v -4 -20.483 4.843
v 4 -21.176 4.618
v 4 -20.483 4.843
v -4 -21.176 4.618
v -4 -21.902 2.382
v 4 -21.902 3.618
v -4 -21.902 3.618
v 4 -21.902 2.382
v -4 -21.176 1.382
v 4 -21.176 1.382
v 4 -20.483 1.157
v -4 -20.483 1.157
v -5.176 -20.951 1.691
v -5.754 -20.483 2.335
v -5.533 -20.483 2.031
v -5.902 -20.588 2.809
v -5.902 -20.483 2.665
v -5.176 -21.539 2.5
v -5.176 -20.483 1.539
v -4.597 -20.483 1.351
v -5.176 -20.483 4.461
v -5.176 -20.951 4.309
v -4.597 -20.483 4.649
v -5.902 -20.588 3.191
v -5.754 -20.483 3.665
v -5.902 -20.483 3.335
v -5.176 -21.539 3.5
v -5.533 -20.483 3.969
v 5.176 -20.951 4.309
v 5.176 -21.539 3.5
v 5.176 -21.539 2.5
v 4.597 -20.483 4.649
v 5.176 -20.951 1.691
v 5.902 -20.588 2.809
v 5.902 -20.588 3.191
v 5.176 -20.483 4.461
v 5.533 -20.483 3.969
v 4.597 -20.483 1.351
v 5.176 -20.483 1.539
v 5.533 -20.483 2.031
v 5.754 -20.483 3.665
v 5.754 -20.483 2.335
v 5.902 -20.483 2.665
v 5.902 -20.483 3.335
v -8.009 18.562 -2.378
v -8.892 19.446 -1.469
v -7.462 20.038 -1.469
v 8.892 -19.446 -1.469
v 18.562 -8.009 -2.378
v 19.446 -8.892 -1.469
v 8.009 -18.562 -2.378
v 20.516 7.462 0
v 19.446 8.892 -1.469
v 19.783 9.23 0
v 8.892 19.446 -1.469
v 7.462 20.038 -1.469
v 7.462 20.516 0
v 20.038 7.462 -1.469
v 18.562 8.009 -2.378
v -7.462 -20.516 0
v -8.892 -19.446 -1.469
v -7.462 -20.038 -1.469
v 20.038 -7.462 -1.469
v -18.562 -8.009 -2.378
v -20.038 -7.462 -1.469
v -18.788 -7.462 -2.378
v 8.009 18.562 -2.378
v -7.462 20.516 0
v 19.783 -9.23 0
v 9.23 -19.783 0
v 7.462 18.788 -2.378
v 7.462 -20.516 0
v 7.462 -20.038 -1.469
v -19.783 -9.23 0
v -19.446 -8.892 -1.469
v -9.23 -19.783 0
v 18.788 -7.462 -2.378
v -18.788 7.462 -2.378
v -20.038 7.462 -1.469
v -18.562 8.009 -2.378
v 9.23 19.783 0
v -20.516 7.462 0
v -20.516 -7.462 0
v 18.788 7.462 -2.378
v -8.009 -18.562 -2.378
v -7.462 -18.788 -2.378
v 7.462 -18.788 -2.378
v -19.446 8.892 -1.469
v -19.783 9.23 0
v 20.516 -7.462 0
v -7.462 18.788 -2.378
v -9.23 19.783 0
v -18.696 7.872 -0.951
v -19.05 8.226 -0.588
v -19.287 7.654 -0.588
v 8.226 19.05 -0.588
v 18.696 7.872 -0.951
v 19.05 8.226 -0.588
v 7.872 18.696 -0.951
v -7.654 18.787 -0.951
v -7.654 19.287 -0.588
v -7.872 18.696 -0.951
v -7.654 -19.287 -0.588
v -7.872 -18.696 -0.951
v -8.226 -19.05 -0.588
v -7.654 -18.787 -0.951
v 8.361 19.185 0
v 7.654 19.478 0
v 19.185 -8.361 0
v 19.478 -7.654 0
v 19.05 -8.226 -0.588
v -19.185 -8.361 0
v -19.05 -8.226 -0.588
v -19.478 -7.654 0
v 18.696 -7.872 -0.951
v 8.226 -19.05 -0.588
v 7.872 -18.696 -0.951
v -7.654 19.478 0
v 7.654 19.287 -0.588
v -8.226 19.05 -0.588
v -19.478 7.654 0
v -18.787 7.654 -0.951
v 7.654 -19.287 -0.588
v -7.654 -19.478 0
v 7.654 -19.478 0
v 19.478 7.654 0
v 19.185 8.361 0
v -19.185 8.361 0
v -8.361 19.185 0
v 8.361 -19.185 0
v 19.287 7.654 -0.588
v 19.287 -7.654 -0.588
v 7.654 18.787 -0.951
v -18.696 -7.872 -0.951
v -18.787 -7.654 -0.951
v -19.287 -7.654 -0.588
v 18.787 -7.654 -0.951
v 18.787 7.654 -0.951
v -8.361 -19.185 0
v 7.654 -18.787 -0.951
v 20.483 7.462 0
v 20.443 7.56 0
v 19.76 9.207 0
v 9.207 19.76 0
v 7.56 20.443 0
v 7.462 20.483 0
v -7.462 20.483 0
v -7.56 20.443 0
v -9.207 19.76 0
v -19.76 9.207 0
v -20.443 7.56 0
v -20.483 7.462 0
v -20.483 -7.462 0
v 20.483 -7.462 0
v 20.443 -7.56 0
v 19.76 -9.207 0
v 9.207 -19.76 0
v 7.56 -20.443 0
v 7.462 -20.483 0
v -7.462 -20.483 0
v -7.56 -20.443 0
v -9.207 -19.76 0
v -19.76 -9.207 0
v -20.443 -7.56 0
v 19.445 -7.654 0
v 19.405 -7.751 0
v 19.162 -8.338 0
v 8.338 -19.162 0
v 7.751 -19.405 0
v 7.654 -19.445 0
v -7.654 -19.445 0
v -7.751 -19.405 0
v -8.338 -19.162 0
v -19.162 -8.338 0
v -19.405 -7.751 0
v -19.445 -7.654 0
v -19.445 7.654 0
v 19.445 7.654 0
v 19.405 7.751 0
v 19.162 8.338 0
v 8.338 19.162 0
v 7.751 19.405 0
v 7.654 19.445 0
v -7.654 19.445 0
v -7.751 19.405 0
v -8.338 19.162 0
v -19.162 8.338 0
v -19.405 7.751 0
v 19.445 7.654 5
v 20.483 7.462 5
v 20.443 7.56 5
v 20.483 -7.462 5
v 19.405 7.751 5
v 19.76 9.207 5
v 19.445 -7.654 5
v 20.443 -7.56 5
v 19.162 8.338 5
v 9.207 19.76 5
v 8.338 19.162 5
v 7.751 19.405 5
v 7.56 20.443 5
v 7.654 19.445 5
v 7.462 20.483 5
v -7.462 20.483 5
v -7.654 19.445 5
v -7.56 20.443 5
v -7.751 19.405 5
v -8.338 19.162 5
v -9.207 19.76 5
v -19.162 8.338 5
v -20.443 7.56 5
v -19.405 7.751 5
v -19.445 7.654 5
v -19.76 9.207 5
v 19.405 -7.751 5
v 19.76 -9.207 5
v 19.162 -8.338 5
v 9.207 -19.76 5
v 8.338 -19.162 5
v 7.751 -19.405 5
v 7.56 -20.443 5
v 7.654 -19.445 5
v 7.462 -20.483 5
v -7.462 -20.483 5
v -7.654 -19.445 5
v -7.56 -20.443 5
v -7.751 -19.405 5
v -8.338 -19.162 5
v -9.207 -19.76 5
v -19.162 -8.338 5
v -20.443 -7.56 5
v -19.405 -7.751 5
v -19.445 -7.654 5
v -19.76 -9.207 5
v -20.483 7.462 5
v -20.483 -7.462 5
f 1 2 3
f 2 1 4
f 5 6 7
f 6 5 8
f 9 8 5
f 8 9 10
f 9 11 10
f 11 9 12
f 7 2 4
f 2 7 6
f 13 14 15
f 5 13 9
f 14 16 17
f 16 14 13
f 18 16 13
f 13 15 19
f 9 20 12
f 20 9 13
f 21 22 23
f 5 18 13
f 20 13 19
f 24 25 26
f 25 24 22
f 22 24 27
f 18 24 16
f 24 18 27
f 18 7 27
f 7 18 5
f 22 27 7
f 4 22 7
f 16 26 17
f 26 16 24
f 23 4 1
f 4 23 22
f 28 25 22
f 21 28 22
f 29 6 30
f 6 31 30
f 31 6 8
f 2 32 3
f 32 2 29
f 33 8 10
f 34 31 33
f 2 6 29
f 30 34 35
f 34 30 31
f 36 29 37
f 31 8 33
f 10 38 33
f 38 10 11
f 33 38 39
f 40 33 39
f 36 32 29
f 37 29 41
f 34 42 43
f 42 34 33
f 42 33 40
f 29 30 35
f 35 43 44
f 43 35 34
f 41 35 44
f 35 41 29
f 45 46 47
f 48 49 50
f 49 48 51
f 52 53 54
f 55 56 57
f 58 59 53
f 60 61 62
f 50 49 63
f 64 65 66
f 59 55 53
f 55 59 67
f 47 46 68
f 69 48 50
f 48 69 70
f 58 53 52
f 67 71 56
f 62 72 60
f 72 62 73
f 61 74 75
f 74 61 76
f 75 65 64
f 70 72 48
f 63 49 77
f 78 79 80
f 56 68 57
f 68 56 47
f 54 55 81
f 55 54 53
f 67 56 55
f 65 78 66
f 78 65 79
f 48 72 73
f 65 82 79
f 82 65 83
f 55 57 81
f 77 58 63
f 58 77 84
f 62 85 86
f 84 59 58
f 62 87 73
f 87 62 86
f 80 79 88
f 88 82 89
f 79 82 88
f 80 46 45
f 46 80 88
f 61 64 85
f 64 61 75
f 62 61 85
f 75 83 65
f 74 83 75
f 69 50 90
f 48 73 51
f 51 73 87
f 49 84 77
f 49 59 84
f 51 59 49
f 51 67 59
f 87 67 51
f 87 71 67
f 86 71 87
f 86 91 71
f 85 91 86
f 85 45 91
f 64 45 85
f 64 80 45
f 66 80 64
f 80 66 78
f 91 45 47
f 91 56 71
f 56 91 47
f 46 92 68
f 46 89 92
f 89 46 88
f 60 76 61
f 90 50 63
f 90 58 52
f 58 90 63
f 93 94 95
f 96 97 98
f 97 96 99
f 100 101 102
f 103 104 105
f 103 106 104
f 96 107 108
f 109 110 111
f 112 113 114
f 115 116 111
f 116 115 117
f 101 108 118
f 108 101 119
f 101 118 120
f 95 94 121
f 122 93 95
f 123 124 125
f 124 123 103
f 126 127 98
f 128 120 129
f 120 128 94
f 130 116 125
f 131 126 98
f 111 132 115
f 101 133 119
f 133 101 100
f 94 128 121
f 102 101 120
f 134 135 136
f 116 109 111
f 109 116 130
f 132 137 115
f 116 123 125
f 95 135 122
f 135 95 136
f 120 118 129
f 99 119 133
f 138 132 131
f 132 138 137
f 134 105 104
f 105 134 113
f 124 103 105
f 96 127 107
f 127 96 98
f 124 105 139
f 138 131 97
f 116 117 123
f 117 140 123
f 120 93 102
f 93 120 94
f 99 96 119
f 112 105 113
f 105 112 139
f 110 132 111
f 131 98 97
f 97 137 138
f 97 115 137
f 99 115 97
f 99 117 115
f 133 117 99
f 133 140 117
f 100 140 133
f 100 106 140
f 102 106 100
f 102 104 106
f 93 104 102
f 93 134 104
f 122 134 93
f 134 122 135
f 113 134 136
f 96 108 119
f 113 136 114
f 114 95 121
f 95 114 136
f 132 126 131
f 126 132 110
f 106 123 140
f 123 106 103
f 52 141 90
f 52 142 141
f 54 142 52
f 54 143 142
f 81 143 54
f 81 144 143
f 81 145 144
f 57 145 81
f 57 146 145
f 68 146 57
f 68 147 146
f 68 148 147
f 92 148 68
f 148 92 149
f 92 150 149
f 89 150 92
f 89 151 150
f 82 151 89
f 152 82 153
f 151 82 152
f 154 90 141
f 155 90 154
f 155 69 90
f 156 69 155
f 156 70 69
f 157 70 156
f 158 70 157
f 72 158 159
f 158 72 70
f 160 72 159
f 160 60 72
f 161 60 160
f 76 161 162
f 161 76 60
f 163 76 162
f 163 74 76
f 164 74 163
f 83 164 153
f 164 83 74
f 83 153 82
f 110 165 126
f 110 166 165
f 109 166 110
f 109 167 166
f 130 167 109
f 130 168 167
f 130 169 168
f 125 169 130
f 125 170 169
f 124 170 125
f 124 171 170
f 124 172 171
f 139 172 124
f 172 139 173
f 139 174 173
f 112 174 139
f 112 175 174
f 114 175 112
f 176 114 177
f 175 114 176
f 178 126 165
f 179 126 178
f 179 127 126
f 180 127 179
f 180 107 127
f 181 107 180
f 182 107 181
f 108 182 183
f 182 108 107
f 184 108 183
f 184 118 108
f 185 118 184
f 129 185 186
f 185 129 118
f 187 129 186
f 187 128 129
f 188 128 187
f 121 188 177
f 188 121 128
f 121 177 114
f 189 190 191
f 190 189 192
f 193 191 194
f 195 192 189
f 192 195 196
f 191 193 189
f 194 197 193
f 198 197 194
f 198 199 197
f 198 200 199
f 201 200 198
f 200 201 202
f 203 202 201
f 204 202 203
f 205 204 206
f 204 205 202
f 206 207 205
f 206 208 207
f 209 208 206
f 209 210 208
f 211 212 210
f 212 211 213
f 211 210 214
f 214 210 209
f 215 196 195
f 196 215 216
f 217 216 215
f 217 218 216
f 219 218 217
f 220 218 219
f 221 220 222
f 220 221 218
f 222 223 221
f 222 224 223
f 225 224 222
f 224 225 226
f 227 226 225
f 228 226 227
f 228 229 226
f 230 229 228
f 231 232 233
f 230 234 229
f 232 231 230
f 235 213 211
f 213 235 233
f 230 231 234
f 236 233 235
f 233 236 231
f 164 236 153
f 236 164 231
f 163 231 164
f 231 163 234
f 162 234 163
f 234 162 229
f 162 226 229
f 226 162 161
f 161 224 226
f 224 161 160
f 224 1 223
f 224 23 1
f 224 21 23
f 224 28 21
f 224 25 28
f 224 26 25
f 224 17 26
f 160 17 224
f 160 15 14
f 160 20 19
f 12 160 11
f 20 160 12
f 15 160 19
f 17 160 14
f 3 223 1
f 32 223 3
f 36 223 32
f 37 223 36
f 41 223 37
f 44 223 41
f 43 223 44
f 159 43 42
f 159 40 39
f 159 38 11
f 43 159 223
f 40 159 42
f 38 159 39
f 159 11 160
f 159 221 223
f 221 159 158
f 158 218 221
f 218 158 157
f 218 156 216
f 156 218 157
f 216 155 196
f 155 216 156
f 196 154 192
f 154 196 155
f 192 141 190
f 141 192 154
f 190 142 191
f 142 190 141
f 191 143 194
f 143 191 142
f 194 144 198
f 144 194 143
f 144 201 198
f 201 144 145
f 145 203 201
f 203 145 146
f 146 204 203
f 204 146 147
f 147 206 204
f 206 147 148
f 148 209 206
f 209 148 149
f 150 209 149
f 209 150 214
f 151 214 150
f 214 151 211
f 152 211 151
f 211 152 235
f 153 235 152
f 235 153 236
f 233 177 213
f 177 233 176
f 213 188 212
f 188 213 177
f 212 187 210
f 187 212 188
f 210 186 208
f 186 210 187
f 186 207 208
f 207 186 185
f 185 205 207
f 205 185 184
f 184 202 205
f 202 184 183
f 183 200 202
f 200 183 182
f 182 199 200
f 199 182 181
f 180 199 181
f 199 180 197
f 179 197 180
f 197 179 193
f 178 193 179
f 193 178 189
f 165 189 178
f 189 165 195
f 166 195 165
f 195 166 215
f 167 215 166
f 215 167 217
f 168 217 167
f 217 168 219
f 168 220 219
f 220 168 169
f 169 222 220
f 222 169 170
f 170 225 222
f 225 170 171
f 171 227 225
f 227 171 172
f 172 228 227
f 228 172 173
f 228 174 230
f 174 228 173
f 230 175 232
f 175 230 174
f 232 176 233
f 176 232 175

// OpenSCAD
$fn = 10;

/* Module Definitions */

module rounded_hex(r, h) {
    rotate([0, 0, 22.5])
    hull(){
        for (i=[0:8]) {
            rotate([0, 0, i*45])
            translate([r, 0, 0])
                cylinder(h=h, r=3, center=true);
        }
    }
}

// radius, height, corner-radius
module rounded_octagon(r, h, cr) {
    rotate([0, 0, 22.5])
    hull(){
        for (i=[0:7]) {
            rotate([0, 0, i*45])
            translate([(r - cr), 0, 0])
                cylinder(h=h, r=cr, center=true);
        }
    }
}

// radius, height
module rounded_octagon_2(r, h) {
    hull() {
        for (i=[0:7]) {
            rotate([0, 0, i*45])
                translate([cos(22.5) * (r-h/2), 0, 0])
                rotate([90, 0, 0])
                cylinder(h = 2 * (r - h/2) * cos(67.5),
                        r = h / 2,
                        center = true);
        }
    }
}

// radius, height, wall-thickness
module bottom_shell(r, h, t) {
    difference() {
        rounded_hex(r, h)

        translate([-50, -50, 0])
        cube([100, 100, 10]);

        translate([0, 0, 1])
        rounded_hex(r - t, h);
    }
}

module pcb() {
    difference() {
        rounded_hex(17, 2);
        translate([2, -19, 0]) cube([10, 4, 10], center=true);
    }
}

module battery() {
    color([1, 0, 1, 1])
    cylinder(h=3.4, r=15, center=true);
}


module display() {
    color([1, 0, 0, 1])
    translate([-16.5, 16, 0])
    import("display.stl");
}

module rounded_box(dim, r) {
    minkowski() {
        cube(dim, center=true);
        sphere(r=r);
    }
}

module hollowed_octagon(r, h, wt=1) {
    difference() {
        translate([]) rounded_octagon_2(r, 5);
        rounded_octagon_2(r-wt, 2, 3);
    }
}

module capped_cylinder(r, h) {
    cylinder(r=r, h=(h-2*r), center=true);
    translate([0, 0, -(h-2*r)/2])
        sphere(r=r);
    translate([0, 0, (h-2*r)/2])
        sphere(r=r);
}

// Radius, height, wallthickness
module bottom(r, h, wt=1) {

    translate([0, -20, 3])
        rotate([0, 90, 0])
        difference() {
            capped_cylinder(r=2, h=12);
            translate([0, 10, ])
                cube([20, 20, 20], center=true); 
        }

    union() {
        linear_extrude(height=h) {
            projection(cut=true) {
                translate([0, 0, 0.1])
                    hollowed_octagon(r, h, wt);
            }
        }

        difference() {
            hollowed_octagon(r, h, wt);
            translate([-r, -r, 0]) cube([r*2, r*2, h*5]);
        }   
    }
}

// Radius height wallthickness
module top(r, h, wt=1) {
    union() {
        translate([0, 0, -h])
        linear_extrude(height=h) {
            projection(cut=true) {
                translate([0, 0, 0.1])
                    hollowed_octagon(r, h, wt);
            }
        }

        difference() {
            hollowed_octagon(r, h, wt);
            translate([0, 0, -(h*5)/2])
                cube([r*2, r*2, h*5], center=true);
            cylinder(r=15, h=10);
        }   
    }
}


/* Global Variables */

radius = 20;
bottom_height = 6;
thickness = 1;


/* Main Objects */

/*
difference() {
    translate([0, 0, -1]) bottom_shell(radius, bottom_height, thickness);
    translate([0, -20, 0]) cube([50, 10, 50], center=true);
}
*/


//translate([0, 0, 5]) battery();
//translate([0, 0, 10]) pcb();
translate([0, 0, 15]) display();
!bottom(22, 5);
translate([0, 0, 11]) top(22, 5);
